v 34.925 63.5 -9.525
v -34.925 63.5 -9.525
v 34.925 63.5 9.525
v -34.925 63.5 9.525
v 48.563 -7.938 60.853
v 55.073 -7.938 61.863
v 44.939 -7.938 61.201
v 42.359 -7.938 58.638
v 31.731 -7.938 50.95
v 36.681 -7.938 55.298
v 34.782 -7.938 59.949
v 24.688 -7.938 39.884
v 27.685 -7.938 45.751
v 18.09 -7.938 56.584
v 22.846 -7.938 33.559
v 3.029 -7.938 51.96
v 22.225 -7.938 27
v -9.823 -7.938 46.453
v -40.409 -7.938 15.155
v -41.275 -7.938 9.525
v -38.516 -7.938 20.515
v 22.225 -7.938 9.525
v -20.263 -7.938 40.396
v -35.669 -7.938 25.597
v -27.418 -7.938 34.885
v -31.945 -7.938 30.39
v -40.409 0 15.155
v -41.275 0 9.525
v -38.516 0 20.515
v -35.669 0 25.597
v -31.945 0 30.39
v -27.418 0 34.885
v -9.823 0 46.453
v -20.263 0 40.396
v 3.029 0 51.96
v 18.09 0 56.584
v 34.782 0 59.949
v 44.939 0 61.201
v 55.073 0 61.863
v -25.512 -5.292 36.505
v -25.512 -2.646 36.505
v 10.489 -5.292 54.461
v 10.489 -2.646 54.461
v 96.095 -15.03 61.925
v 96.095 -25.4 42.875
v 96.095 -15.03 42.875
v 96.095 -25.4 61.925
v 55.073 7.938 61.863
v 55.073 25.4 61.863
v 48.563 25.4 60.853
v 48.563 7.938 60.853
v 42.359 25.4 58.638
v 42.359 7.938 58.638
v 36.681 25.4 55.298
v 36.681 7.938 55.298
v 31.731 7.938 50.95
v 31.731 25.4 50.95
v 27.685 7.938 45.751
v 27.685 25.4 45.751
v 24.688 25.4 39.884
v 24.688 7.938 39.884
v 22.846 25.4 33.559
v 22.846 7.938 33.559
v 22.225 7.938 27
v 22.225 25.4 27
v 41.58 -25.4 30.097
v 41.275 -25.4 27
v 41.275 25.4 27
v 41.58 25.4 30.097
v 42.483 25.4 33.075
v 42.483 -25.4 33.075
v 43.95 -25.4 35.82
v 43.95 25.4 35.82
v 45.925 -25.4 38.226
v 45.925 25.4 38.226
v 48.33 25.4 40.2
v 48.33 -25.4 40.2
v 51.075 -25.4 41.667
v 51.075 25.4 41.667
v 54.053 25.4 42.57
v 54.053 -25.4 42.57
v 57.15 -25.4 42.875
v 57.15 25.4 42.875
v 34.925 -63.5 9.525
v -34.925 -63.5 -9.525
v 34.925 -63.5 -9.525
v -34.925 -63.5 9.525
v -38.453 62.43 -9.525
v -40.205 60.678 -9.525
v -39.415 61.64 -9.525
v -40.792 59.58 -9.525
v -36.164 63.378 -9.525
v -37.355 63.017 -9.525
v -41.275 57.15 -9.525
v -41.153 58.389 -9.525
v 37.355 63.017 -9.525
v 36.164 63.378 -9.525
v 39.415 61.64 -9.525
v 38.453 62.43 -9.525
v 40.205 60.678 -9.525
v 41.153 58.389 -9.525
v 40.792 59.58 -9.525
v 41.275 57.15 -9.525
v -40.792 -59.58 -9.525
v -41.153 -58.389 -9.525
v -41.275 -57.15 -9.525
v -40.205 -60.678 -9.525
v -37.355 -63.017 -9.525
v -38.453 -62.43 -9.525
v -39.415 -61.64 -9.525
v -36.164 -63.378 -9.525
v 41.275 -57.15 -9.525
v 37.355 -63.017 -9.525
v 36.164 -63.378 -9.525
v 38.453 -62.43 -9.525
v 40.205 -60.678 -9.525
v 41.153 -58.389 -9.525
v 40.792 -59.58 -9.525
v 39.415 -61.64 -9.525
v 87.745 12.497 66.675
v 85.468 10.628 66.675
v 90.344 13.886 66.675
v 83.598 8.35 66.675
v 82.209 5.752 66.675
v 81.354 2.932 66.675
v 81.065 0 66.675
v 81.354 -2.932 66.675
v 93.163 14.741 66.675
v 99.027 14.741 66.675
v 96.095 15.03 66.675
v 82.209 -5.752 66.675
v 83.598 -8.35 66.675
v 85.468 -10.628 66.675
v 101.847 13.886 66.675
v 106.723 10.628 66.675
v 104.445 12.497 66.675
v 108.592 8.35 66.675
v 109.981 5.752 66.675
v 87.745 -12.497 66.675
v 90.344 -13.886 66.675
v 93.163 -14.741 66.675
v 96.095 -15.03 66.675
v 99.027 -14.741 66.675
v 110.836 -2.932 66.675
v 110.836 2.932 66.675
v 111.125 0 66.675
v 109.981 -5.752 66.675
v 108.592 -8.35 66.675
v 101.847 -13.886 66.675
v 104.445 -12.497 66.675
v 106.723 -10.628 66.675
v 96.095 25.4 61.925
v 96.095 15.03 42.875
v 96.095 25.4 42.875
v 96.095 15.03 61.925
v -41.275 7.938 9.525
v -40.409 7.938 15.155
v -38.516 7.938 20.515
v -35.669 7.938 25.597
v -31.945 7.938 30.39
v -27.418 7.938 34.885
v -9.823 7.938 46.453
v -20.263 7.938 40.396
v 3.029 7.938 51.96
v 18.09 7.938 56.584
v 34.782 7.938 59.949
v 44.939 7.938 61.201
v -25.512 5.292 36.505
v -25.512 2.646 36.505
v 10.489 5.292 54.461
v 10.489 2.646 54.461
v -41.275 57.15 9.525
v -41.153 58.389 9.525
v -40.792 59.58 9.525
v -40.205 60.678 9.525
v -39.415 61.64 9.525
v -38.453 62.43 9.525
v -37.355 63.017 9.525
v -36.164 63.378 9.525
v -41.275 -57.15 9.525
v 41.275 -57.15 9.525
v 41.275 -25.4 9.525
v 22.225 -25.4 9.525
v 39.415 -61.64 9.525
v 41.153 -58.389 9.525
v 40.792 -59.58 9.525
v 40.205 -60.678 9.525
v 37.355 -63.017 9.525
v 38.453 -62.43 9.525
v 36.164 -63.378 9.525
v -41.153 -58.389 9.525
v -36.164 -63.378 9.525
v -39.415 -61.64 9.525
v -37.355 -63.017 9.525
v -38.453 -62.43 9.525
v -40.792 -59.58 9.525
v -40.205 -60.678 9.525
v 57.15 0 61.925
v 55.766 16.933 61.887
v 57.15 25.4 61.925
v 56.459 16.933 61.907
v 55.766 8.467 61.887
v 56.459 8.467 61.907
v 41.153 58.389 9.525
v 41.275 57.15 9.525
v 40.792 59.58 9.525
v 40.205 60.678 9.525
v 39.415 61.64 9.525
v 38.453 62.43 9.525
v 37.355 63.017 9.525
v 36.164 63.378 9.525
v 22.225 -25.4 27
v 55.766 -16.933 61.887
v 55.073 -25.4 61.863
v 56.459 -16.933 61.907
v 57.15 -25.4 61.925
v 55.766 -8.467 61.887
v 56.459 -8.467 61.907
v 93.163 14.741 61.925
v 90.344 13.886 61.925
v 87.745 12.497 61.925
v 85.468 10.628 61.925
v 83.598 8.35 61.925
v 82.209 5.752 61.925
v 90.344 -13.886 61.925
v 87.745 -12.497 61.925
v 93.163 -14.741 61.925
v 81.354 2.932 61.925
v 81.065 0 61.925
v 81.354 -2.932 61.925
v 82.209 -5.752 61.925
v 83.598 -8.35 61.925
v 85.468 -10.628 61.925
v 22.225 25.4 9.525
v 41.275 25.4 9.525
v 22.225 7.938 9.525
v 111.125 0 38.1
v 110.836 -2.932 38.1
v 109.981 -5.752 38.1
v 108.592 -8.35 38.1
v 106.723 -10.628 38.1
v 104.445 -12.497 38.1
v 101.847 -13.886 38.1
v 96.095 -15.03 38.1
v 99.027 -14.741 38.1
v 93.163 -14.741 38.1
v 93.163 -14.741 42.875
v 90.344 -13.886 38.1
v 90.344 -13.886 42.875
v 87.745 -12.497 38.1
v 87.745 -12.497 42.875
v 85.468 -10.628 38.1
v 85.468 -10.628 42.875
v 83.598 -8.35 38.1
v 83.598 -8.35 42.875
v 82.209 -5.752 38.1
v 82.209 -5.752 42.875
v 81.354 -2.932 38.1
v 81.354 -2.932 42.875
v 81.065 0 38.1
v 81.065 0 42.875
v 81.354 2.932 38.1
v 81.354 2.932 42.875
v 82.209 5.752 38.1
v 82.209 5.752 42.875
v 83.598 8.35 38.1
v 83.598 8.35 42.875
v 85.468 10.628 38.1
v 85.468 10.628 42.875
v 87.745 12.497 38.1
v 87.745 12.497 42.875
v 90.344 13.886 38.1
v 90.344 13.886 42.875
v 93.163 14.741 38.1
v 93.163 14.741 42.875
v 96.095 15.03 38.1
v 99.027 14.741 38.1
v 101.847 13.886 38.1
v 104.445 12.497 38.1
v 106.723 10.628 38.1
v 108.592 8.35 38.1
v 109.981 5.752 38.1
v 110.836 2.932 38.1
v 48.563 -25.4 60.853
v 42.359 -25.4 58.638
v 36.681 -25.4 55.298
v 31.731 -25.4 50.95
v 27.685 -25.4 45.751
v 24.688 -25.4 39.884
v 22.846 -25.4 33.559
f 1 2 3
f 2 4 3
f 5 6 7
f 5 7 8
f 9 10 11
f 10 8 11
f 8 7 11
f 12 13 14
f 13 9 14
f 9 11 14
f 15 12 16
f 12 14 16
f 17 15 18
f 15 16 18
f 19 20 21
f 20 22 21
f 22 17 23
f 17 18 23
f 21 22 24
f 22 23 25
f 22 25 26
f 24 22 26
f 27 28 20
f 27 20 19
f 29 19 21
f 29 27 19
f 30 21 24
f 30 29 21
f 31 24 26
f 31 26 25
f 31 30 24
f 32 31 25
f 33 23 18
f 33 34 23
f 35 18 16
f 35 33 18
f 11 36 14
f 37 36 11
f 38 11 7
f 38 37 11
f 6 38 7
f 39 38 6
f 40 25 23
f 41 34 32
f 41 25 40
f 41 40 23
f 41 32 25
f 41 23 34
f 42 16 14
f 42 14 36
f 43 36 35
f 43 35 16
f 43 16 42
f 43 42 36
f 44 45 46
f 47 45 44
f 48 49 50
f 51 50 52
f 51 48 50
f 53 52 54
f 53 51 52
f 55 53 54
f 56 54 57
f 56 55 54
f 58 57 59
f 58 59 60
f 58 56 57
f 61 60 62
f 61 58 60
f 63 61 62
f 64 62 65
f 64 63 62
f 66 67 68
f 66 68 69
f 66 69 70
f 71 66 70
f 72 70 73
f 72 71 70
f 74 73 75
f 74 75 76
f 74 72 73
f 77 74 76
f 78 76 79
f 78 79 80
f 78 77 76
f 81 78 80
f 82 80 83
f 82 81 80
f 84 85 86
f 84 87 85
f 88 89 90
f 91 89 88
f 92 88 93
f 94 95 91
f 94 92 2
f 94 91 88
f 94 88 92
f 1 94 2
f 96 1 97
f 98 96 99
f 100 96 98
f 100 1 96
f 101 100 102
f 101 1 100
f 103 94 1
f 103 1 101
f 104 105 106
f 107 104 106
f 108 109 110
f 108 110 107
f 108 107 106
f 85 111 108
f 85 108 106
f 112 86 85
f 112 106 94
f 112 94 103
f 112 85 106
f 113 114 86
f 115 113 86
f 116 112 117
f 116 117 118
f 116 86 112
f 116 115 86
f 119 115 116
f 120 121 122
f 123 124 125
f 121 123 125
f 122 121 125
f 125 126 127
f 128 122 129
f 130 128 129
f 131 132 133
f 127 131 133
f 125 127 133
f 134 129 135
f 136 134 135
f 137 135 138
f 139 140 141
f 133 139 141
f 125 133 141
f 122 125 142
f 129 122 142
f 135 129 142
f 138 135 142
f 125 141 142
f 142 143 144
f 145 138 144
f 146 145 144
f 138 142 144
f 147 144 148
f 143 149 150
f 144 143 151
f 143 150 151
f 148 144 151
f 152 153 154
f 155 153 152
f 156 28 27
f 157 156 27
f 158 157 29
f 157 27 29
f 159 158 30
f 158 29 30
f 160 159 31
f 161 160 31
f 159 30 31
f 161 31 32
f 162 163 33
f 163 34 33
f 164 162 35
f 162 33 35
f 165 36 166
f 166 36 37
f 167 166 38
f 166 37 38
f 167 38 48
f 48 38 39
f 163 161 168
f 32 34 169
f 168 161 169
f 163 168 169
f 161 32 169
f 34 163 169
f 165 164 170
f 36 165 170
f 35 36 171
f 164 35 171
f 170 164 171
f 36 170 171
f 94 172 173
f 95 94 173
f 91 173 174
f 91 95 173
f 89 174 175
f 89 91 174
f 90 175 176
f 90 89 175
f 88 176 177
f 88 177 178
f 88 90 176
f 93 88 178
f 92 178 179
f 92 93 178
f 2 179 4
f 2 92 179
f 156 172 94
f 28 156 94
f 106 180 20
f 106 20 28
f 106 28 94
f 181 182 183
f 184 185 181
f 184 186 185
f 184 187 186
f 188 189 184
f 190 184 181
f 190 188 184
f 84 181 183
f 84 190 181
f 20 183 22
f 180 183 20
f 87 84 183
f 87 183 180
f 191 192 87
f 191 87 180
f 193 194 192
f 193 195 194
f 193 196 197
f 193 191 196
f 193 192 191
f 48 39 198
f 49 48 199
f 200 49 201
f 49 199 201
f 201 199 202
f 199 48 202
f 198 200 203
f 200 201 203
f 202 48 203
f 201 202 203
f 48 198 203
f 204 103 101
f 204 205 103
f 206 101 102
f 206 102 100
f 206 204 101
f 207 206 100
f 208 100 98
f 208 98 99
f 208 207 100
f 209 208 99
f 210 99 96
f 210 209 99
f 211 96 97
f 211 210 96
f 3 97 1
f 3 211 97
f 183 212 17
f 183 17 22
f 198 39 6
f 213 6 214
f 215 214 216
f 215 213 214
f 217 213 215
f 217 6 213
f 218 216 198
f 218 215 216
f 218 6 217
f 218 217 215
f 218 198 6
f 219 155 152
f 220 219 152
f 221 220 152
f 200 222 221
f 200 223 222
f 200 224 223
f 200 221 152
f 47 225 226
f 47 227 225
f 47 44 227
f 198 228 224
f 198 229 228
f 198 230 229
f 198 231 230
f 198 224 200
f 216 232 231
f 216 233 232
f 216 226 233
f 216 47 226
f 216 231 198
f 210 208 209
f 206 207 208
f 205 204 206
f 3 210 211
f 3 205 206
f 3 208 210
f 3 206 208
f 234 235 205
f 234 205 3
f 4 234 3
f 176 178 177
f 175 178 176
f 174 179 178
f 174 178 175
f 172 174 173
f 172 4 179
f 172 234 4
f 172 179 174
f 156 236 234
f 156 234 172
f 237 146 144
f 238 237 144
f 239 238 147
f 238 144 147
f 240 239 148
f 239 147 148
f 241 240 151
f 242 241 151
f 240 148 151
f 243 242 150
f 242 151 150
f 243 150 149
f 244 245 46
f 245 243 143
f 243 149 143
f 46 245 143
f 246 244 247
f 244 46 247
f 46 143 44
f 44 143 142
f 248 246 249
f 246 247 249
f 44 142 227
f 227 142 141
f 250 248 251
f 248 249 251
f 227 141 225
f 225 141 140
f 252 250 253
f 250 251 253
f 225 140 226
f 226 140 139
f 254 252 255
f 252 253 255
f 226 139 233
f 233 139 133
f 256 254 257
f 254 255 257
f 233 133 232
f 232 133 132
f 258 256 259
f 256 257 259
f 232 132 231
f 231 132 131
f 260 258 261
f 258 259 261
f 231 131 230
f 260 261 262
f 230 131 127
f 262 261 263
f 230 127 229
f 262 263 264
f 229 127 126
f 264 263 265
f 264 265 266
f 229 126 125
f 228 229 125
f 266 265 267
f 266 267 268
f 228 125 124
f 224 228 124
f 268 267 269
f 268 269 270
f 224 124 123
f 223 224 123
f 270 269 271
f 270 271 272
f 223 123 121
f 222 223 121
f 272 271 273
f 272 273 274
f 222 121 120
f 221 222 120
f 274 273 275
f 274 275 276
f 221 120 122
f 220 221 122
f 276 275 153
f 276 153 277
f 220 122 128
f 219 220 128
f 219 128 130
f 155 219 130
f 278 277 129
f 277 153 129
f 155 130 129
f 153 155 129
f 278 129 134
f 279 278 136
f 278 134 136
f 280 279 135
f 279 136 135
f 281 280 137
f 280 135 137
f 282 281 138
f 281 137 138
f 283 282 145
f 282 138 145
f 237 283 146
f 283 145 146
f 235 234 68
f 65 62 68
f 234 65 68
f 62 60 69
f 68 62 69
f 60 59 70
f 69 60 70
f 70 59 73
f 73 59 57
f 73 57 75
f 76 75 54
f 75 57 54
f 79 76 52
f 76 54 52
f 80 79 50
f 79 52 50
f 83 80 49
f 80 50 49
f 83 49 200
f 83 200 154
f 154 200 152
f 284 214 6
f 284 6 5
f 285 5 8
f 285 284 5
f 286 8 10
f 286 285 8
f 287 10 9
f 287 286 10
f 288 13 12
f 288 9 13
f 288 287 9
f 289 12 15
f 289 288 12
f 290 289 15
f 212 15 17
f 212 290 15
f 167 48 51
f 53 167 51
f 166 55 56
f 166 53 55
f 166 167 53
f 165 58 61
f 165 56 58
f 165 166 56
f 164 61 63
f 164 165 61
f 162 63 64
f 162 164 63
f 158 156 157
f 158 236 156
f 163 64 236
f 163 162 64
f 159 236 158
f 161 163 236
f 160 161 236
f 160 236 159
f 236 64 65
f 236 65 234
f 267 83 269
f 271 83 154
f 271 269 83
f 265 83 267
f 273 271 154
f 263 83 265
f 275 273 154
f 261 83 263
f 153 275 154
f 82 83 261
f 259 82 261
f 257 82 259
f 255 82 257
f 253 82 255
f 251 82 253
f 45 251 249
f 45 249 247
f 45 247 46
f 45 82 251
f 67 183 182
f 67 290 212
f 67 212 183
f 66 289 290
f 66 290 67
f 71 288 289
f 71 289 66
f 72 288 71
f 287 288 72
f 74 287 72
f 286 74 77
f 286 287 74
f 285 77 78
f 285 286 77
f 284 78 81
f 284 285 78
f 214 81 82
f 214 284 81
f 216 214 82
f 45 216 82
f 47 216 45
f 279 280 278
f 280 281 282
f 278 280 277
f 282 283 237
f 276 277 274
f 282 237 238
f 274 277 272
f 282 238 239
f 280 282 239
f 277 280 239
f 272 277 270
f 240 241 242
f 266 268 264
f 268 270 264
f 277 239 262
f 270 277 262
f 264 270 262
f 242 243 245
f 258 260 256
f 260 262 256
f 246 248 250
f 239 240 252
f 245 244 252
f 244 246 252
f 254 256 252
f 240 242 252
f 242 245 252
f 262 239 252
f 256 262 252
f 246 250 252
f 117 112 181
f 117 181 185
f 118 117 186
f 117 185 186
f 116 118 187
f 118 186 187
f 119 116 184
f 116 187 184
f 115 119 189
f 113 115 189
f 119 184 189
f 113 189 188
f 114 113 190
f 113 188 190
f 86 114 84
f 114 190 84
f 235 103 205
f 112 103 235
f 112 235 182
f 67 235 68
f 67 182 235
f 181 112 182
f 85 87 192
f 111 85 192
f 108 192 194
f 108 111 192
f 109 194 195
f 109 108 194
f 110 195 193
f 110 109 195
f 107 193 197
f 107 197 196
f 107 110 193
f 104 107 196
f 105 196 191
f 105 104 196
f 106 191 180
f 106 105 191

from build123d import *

# Parameters (mm, degrees)
F1_DEPTH = 63.5
F0_W     = 35.7702043533
F0_H     = 19.0499988828
F2_DEPTH = 25.4
F3_DEPTH = 7.9375
F5_R     = 6.35


# Not quite as in the source:
# - ends of sketch curves that miss each other by under 0.0002 mm in the source are joined


with BuildPart() as f1:
    # F0 (on Front) → F1 (new body, symmetric)
    with BuildSketch(Plane.XZ):
        Polygon((-41.275, -9.525), (41.275, -9.525), (41.275, 9.525), (22.225, 9.525), (-41.275, 9.525), align=None)
    extrude(amount=F1_DEPTH, both=True)

    # F0 (on Front) → F2 (join, symmetric)
    with BuildSketch(Plane.XZ):
        with BuildLine():
            Line((22.225, 9.525), (41.275, 9.525))
            Line((41.275, 9.525), (41.275, 27.0002))
            ThreePointArc((41.275, 27.0002), (45.9246798487, 38.2255201513), (57.15, 42.8752))
            Line((57.15, 42.8752), (60.325, 42.8752))
            Line((60.325, 42.8752), (60.325, 61.9251988828))
            Line((60.325, 61.9251988828), (57.15, 61.9251988828))
            add(Edge.make_bspline(
                [(55.0732880095, 61.8634025538), (55.7666834516, 61.8883145564), (56.4589847756, 61.9089220973), (57.15, 61.9251988828)],
                knots=[109.8121329902, 109.8121329902, 109.8121329902, 109.8121329902, 111.5045361635, 111.5045361635, 111.5045361635, 111.5045361635], degree=3))
            ThreePointArc((55.0732880095, 61.8634025538), (31.7306688594, 50.9504239941), (22.225, 27.0002))
            Line((22.225, 27.0002), (22.225, 9.525))
        make_face()
        with Locations((78.2101021767, 52.4001994414)):
            Rectangle(F0_W, F0_H)
    extrude(amount=F2_DEPTH, both=True)

    # F0 (on Front) → F3 (join, symmetric)
    with BuildSketch(Plane.XZ):
        with BuildLine():
            add(Edge.make_bspline(
                [(-41.275, 9.525), (-39.5154446815, 40.5083175564), (10.0820981423, 60.2469791277), (55.0732880095, 61.8634025538)],
                knots=[0, 0, 0, 0, 109.8121329902, 109.8121329902, 109.8121329902, 109.8121329902], degree=3))
            Line((-41.275, 9.525), (22.225, 9.525))
            Line((22.225, 9.525), (22.225, 27.0002))
            ThreePointArc((22.225, 27.0002), (31.7306688594, 50.9504239941), (55.0732880095, 61.8634025538))
        make_face()
    extrude(amount=F3_DEPTH, both=True)

    # F0 (on Front) → F4 (revolve)
    with BuildSketch(Plane.XZ):
        Polygon((96.0952043533, 61.9251988828), (96.0952043533, 42.8752), (96.0952043533, 38.1), (111.125, 38.1), (111.125, 66.675), (96.0952043533, 66.675), align=None)
    revolve(axis=Axis((96.0952043533, 0, 52.3875), (0, 0, -1)))

    # F5
    f5_edges = [f1.edges().sort_by_distance(p)[0] for p in [
        (41.275, -63.5, 0),
        (-41.275, -63.5, 0),
        (41.275, 63.5, 0),
        (-41.275, 63.5, 0),
    ]]
    fillet(f5_edges, radius=F5_R)


solid = f1.part
